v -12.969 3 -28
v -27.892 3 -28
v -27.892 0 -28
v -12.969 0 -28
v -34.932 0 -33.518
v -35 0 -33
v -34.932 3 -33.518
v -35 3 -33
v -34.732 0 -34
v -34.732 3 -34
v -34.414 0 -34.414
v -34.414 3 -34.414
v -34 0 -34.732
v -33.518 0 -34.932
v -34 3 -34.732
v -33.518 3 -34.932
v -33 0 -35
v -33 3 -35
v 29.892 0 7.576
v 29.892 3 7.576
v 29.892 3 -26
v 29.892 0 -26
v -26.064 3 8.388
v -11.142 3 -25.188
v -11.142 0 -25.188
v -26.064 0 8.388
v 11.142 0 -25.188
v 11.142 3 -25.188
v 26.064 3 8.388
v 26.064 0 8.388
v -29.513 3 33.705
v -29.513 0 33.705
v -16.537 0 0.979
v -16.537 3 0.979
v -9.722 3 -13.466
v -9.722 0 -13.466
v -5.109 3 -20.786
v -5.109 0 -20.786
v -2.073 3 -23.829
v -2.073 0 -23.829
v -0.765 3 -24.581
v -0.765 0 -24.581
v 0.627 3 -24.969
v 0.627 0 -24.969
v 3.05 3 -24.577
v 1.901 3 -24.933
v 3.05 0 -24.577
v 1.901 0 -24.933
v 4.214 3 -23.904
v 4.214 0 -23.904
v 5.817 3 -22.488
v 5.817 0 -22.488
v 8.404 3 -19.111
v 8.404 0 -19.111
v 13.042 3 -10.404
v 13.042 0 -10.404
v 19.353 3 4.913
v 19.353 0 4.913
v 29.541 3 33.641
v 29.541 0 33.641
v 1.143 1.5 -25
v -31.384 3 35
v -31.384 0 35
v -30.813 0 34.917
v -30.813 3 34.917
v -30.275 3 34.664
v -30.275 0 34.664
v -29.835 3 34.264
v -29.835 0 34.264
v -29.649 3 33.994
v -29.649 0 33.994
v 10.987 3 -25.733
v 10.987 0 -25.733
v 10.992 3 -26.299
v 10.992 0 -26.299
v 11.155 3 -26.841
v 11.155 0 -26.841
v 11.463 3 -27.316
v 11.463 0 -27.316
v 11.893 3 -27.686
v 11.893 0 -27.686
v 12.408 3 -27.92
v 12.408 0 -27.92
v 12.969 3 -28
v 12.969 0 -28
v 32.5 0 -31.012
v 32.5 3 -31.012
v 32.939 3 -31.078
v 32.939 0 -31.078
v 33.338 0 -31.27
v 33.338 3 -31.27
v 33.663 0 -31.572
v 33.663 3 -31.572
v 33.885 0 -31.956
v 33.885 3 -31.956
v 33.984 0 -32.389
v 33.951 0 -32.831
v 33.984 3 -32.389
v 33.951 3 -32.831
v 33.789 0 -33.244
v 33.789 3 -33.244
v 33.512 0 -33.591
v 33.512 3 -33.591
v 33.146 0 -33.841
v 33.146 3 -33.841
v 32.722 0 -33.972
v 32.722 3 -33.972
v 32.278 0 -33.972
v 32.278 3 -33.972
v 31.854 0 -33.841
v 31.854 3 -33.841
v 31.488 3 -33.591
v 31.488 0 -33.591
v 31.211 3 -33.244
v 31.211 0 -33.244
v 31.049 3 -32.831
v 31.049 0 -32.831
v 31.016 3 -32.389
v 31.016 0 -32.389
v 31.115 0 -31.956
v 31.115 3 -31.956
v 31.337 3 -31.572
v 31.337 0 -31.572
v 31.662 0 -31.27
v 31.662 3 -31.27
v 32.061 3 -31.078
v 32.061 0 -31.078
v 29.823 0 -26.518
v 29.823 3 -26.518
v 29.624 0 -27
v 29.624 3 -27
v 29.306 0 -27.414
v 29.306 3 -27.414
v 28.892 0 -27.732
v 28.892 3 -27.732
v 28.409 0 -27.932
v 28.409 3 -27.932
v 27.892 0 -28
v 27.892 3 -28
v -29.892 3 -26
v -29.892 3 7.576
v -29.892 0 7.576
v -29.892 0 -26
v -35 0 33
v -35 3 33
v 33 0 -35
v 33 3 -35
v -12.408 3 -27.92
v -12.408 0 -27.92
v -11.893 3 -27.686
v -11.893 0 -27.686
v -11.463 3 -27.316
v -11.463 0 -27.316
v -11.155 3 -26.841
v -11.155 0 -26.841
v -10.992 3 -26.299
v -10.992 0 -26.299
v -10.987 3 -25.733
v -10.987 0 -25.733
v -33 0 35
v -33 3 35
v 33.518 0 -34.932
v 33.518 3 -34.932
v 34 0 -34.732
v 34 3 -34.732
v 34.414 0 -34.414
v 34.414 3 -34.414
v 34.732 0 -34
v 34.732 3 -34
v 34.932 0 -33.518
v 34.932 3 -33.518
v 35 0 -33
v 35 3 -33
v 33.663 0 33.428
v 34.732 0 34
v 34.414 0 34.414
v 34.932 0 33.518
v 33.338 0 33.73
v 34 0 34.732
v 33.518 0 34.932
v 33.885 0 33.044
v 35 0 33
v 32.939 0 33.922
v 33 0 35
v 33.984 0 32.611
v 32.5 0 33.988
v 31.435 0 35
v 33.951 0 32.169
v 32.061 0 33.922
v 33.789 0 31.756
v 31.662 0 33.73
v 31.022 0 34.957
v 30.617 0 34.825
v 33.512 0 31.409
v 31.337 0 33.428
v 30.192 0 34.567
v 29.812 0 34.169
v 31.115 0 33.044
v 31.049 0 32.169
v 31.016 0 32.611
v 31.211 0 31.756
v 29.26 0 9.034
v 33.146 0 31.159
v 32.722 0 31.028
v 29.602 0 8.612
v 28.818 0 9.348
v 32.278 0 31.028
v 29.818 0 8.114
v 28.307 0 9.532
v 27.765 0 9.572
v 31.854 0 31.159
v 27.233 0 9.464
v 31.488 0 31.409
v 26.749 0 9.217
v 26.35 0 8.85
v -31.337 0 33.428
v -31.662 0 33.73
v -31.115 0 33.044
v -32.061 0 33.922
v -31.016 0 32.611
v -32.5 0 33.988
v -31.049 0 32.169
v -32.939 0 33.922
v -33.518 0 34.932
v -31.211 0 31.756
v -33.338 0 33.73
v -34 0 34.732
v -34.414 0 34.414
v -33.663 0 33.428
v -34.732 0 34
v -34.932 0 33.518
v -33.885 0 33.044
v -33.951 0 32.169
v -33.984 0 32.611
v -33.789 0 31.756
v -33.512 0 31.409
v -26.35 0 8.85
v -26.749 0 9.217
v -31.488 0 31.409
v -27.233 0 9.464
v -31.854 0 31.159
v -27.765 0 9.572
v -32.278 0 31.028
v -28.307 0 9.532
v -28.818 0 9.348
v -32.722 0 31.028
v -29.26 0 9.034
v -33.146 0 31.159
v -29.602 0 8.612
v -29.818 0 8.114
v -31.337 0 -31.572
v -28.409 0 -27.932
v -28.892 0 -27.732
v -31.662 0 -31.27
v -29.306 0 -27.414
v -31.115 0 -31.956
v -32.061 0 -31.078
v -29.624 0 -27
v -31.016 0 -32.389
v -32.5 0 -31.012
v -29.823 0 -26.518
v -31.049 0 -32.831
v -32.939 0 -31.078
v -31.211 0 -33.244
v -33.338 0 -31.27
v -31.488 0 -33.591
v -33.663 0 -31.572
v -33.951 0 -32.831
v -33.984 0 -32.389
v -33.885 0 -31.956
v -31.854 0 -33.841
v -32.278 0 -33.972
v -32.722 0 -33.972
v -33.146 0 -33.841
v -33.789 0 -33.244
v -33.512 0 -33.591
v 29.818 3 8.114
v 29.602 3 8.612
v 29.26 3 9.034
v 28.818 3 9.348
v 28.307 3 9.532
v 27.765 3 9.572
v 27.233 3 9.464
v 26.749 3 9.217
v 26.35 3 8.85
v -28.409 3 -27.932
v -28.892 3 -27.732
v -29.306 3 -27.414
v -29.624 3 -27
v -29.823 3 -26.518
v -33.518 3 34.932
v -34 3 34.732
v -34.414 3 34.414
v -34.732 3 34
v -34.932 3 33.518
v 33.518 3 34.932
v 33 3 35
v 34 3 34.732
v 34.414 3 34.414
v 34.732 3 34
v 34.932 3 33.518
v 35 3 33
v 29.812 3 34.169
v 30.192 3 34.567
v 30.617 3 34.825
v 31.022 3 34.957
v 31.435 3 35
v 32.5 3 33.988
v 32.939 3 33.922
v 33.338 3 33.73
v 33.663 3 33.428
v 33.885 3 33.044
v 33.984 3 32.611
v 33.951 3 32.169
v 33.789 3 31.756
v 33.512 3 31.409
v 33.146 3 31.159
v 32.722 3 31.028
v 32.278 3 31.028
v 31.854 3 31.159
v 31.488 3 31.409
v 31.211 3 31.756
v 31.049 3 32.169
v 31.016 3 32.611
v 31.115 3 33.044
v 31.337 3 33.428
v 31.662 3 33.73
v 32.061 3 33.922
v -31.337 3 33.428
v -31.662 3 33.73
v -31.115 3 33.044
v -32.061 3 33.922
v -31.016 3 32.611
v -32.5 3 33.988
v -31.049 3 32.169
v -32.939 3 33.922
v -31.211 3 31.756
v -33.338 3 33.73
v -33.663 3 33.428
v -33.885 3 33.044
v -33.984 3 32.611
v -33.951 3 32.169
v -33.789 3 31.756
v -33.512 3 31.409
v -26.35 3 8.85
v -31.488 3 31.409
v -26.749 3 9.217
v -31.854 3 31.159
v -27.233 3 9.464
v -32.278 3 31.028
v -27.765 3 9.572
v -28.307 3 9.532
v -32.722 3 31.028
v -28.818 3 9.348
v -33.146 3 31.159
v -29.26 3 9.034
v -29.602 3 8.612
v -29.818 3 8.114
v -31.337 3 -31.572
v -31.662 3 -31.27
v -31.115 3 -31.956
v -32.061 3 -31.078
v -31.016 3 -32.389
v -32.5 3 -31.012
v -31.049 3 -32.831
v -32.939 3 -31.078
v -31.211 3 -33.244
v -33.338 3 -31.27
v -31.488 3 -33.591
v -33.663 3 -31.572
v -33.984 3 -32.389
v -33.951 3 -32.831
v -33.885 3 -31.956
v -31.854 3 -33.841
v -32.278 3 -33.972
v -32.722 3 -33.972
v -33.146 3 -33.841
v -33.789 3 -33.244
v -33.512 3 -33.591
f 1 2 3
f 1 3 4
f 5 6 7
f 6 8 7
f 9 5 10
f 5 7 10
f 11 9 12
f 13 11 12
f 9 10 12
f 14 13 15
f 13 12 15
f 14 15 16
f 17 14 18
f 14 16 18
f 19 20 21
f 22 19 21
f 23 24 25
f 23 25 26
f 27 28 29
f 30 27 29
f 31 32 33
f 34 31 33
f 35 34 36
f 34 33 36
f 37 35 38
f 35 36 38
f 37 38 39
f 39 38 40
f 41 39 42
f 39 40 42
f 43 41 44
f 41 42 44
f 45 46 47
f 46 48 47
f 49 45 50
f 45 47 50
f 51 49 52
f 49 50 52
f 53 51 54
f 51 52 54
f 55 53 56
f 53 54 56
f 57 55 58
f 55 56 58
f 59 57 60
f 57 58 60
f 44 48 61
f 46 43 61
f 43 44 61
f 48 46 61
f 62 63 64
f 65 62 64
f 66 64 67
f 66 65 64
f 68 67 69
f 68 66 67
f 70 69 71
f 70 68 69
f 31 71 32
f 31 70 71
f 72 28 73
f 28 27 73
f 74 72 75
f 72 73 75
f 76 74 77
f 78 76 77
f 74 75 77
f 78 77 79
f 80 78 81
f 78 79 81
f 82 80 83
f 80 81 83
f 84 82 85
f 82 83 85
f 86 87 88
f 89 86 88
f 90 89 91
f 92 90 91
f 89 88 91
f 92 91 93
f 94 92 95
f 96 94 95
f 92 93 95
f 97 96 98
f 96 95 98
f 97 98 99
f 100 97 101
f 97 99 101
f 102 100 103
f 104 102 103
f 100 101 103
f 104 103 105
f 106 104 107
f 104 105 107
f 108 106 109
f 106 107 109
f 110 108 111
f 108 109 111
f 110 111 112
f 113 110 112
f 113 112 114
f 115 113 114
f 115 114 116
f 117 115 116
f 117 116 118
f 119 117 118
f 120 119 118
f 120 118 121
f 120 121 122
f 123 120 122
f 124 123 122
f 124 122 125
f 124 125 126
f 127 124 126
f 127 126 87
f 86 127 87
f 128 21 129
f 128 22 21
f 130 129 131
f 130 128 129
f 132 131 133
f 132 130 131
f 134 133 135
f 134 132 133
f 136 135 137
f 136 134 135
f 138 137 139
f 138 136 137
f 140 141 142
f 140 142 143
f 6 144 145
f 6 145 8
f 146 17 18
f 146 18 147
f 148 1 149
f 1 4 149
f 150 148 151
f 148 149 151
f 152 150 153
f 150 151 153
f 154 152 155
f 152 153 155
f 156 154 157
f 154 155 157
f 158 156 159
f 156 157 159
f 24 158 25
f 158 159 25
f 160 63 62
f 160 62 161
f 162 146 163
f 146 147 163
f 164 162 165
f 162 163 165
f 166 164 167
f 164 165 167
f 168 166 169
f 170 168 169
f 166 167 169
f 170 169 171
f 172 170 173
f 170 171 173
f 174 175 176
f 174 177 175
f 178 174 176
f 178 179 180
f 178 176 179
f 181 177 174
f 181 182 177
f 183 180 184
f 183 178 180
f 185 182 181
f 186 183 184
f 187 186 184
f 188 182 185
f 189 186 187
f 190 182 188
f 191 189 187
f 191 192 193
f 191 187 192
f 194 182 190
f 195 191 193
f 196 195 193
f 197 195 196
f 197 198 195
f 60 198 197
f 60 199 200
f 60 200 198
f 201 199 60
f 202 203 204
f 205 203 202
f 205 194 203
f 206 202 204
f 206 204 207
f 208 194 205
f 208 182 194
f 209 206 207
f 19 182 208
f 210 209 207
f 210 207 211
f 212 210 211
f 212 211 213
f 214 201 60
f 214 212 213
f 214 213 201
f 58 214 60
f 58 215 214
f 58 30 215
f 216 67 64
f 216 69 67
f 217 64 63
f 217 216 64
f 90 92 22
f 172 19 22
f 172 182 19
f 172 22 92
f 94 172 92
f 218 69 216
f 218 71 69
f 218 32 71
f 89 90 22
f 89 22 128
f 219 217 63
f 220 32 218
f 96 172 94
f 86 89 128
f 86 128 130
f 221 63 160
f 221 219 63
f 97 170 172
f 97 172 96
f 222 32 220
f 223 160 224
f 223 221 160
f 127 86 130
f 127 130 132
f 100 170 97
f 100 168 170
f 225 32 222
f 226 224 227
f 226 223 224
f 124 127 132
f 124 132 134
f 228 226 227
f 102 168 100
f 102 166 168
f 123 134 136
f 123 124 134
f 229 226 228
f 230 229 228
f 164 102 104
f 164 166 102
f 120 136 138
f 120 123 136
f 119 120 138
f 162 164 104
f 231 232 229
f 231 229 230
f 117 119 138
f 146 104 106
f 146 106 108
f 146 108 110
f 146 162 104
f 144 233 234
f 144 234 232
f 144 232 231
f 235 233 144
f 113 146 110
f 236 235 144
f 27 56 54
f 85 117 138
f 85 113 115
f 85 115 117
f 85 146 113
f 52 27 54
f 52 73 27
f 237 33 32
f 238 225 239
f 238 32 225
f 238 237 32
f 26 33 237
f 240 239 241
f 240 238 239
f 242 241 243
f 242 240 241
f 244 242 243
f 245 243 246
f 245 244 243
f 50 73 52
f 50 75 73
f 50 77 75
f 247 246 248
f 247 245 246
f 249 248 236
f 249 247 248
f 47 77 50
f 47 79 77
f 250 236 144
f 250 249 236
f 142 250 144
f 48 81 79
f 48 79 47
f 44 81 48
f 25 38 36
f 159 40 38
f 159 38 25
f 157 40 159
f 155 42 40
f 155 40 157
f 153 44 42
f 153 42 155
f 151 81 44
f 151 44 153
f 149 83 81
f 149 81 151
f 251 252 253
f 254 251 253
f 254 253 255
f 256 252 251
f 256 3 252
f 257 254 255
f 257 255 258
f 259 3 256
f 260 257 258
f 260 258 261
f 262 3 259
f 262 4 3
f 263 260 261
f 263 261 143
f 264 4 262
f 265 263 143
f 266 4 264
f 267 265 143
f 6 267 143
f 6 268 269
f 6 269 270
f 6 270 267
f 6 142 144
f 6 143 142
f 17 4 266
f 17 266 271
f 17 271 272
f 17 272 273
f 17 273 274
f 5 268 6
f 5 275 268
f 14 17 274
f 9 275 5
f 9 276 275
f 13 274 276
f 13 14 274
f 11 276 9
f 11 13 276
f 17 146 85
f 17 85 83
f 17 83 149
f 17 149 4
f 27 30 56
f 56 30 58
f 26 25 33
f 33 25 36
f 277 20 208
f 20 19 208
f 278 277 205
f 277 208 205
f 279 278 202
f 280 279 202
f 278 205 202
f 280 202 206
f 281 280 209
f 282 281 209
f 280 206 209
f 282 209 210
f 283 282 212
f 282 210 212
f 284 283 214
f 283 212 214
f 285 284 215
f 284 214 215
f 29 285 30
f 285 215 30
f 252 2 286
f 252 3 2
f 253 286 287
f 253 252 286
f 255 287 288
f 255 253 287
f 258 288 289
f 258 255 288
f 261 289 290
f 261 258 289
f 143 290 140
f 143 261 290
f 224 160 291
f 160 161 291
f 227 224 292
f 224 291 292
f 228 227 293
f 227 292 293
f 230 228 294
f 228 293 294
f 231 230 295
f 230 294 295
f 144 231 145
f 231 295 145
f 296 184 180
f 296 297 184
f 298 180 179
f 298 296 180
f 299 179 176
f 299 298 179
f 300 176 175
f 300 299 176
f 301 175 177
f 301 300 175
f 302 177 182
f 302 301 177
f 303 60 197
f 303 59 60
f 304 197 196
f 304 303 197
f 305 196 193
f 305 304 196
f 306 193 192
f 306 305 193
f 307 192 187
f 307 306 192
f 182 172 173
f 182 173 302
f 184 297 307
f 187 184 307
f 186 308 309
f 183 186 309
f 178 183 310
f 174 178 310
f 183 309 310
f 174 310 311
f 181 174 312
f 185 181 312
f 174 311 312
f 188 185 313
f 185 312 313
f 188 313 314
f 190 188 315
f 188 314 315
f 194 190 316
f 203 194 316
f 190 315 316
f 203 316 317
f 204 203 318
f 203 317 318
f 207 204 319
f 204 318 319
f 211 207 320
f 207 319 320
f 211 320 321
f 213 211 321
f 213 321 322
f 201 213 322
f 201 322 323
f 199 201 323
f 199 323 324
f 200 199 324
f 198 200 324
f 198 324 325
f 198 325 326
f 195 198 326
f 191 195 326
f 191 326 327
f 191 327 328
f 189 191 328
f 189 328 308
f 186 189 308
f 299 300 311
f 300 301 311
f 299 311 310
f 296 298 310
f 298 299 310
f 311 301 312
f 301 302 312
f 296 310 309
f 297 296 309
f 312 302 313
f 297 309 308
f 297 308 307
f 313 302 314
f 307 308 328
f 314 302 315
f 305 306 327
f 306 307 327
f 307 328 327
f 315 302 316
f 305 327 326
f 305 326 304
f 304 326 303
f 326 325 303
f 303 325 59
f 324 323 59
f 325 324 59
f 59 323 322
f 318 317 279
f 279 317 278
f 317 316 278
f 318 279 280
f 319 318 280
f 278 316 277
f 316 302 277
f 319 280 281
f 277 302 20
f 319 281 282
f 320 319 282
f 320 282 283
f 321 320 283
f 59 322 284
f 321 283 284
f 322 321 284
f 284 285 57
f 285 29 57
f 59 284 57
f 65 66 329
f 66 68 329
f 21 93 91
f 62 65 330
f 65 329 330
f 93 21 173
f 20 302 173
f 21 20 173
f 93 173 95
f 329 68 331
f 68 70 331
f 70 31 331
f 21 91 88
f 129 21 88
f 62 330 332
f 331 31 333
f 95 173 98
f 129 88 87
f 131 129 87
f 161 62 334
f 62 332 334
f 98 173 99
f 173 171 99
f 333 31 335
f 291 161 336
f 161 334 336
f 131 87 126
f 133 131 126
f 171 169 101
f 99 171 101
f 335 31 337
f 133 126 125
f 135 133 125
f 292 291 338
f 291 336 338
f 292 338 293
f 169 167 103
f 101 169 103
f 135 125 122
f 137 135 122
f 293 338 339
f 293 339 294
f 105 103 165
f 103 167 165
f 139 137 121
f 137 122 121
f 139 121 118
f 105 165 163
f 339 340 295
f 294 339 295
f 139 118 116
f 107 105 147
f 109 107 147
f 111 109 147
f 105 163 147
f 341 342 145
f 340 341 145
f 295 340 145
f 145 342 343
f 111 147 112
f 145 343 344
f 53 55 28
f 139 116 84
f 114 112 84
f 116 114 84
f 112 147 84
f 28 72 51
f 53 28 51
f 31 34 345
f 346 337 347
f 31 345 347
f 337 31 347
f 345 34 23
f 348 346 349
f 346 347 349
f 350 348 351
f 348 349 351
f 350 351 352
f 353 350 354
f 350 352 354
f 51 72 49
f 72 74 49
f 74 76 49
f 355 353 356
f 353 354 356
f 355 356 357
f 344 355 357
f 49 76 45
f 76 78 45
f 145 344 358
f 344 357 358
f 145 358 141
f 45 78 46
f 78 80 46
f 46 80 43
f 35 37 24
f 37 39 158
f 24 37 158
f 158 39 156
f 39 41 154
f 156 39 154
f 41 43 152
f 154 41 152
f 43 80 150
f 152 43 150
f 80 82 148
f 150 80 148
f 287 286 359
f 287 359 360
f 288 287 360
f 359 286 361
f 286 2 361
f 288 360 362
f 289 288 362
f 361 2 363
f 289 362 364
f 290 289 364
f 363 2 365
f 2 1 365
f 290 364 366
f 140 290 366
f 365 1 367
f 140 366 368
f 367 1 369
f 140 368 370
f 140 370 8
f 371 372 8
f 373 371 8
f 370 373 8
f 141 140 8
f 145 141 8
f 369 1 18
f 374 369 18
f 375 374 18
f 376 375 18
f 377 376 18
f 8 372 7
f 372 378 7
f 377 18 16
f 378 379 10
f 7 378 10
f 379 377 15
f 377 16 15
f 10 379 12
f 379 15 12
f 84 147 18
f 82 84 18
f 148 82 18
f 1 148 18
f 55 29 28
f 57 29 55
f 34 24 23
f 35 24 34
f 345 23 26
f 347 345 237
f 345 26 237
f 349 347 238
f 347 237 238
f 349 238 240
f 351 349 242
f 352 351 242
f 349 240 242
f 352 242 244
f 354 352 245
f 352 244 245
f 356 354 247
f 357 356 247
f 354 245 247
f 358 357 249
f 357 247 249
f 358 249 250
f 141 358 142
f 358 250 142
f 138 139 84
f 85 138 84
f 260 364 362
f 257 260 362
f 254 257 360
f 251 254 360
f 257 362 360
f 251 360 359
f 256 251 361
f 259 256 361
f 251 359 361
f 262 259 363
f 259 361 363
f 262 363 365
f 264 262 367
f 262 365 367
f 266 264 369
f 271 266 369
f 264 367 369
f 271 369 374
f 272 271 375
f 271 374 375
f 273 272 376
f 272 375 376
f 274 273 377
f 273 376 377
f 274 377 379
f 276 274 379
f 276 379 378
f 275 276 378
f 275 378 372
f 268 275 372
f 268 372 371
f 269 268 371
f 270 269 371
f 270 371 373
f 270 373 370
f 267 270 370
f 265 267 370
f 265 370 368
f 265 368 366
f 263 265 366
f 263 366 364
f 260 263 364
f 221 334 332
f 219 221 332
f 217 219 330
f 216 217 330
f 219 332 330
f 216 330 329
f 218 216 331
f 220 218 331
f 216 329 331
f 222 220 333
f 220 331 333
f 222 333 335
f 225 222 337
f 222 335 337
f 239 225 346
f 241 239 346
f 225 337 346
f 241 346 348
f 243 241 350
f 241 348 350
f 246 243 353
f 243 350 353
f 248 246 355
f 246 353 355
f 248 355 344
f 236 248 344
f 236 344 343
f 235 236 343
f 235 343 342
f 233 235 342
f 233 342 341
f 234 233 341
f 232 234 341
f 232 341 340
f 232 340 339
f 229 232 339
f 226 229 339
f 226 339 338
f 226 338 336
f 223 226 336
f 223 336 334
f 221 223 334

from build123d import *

# Parameters (mm, degrees)
BOSS_EXTRUDE1_DEPTH = 3
SKETCH3_R           = 1.488133846
CUT_EXTRUDE1_DEPTH  = 50.58830522
FILLET1_R           = 2
CUT_EXTRUDE2_DEPTH  = 50.58830522
FILLET2_R           = 2


with BuildPart() as part:
    # Sketch2 → Boss-Extrude1 (new body)
    with BuildSketch(Plane(origin=(0, 0, 0), x_dir=(1, 0, 0), z_dir=(0, 1, 0))):
        with BuildLine():
            Line((-30, -35), (-35, -35))
            Line((-35, -35), (-35, 35))
            Line((-35, 35), (35, 35))
            Line((35, 35), (35, -35))
            Line((35, -35), (30, -35))
            add(Edge.make_bspline(
                [(-30, -35), (1.605503948, 49.102253739), (30, -35)],
                knots=[0, 0, 0, 1, 1, 1], degree=2, weights=[1, 2.489393758, 1]))
        make_face()
    extrude(amount=BOSS_EXTRUDE1_DEPTH)

    # Sketch3 → Cut-Extrude1 (cut, through all)
    with BuildSketch(Plane(origin=(0, 3, 0), x_dir=(1, 0, 0), z_dir=(0, 1, 0))):
        with Locations(Location((-32.5, 32.5, 0), (0, 0, 270))):
            Circle(SKETCH3_R)
        with Locations(Location((32.5, 32.5, 0), (0, 0, 270))):
            Circle(SKETCH3_R)
        with Locations(Location((32.5, -32.5, 0), (0, 0, 270))):
            Circle(SKETCH3_R)
        with Locations(Location((-32.5, -32.5, 0), (0, 0, 270))):
            Circle(SKETCH3_R)
    extrude(amount=-CUT_EXTRUDE1_DEPTH, mode=Mode.SUBTRACT)

    # Fillet1
    fillet1_edges = [part.edges().sort_by_distance(p)[0] for p in [
        (35, 1.5, 35),
        (30, 1.5, 35),
        (-30, 1.5, 35),
        (-35, 1.5, 35),
        (-35, 1.5, -35),
        (35, 1.5, -35),
    ]]
    fillet(fillet1_edges, radius=FILLET1_R)

    # Sketch4 → Cut-Extrude2 (cut, through all)
    with BuildSketch(Plane(origin=(0, 3, 0), x_dir=(1, 0, 0), z_dir=(0, 1, 0))):
        Polygon((-29.891619327, -17), (-29.891619327, 28), (-9.891619327, 28), align=None)
        Polygon((29.891619327, -17), (29.891619327, 28), (9.891619327, 28), align=None)
    extrude(amount=-CUT_EXTRUDE2_DEPTH, mode=Mode.SUBTRACT)

    # Fillet2
    fillet2_edges = [part.edges().sort_by_distance(p)[0] for p in [
        (-9.891619327, 1.5, -28),
        (-29.891619327, 1.5, 17),
        (-29.891619327, 1.5, -28),
        (29.891619327, 1.5, 17),
        (9.891619327, 1.5, -28),
        (29.891619327, 1.5, -28),
    ]]
    fillet(fillet2_edges, radius=FILLET2_R)


solid = part.part
